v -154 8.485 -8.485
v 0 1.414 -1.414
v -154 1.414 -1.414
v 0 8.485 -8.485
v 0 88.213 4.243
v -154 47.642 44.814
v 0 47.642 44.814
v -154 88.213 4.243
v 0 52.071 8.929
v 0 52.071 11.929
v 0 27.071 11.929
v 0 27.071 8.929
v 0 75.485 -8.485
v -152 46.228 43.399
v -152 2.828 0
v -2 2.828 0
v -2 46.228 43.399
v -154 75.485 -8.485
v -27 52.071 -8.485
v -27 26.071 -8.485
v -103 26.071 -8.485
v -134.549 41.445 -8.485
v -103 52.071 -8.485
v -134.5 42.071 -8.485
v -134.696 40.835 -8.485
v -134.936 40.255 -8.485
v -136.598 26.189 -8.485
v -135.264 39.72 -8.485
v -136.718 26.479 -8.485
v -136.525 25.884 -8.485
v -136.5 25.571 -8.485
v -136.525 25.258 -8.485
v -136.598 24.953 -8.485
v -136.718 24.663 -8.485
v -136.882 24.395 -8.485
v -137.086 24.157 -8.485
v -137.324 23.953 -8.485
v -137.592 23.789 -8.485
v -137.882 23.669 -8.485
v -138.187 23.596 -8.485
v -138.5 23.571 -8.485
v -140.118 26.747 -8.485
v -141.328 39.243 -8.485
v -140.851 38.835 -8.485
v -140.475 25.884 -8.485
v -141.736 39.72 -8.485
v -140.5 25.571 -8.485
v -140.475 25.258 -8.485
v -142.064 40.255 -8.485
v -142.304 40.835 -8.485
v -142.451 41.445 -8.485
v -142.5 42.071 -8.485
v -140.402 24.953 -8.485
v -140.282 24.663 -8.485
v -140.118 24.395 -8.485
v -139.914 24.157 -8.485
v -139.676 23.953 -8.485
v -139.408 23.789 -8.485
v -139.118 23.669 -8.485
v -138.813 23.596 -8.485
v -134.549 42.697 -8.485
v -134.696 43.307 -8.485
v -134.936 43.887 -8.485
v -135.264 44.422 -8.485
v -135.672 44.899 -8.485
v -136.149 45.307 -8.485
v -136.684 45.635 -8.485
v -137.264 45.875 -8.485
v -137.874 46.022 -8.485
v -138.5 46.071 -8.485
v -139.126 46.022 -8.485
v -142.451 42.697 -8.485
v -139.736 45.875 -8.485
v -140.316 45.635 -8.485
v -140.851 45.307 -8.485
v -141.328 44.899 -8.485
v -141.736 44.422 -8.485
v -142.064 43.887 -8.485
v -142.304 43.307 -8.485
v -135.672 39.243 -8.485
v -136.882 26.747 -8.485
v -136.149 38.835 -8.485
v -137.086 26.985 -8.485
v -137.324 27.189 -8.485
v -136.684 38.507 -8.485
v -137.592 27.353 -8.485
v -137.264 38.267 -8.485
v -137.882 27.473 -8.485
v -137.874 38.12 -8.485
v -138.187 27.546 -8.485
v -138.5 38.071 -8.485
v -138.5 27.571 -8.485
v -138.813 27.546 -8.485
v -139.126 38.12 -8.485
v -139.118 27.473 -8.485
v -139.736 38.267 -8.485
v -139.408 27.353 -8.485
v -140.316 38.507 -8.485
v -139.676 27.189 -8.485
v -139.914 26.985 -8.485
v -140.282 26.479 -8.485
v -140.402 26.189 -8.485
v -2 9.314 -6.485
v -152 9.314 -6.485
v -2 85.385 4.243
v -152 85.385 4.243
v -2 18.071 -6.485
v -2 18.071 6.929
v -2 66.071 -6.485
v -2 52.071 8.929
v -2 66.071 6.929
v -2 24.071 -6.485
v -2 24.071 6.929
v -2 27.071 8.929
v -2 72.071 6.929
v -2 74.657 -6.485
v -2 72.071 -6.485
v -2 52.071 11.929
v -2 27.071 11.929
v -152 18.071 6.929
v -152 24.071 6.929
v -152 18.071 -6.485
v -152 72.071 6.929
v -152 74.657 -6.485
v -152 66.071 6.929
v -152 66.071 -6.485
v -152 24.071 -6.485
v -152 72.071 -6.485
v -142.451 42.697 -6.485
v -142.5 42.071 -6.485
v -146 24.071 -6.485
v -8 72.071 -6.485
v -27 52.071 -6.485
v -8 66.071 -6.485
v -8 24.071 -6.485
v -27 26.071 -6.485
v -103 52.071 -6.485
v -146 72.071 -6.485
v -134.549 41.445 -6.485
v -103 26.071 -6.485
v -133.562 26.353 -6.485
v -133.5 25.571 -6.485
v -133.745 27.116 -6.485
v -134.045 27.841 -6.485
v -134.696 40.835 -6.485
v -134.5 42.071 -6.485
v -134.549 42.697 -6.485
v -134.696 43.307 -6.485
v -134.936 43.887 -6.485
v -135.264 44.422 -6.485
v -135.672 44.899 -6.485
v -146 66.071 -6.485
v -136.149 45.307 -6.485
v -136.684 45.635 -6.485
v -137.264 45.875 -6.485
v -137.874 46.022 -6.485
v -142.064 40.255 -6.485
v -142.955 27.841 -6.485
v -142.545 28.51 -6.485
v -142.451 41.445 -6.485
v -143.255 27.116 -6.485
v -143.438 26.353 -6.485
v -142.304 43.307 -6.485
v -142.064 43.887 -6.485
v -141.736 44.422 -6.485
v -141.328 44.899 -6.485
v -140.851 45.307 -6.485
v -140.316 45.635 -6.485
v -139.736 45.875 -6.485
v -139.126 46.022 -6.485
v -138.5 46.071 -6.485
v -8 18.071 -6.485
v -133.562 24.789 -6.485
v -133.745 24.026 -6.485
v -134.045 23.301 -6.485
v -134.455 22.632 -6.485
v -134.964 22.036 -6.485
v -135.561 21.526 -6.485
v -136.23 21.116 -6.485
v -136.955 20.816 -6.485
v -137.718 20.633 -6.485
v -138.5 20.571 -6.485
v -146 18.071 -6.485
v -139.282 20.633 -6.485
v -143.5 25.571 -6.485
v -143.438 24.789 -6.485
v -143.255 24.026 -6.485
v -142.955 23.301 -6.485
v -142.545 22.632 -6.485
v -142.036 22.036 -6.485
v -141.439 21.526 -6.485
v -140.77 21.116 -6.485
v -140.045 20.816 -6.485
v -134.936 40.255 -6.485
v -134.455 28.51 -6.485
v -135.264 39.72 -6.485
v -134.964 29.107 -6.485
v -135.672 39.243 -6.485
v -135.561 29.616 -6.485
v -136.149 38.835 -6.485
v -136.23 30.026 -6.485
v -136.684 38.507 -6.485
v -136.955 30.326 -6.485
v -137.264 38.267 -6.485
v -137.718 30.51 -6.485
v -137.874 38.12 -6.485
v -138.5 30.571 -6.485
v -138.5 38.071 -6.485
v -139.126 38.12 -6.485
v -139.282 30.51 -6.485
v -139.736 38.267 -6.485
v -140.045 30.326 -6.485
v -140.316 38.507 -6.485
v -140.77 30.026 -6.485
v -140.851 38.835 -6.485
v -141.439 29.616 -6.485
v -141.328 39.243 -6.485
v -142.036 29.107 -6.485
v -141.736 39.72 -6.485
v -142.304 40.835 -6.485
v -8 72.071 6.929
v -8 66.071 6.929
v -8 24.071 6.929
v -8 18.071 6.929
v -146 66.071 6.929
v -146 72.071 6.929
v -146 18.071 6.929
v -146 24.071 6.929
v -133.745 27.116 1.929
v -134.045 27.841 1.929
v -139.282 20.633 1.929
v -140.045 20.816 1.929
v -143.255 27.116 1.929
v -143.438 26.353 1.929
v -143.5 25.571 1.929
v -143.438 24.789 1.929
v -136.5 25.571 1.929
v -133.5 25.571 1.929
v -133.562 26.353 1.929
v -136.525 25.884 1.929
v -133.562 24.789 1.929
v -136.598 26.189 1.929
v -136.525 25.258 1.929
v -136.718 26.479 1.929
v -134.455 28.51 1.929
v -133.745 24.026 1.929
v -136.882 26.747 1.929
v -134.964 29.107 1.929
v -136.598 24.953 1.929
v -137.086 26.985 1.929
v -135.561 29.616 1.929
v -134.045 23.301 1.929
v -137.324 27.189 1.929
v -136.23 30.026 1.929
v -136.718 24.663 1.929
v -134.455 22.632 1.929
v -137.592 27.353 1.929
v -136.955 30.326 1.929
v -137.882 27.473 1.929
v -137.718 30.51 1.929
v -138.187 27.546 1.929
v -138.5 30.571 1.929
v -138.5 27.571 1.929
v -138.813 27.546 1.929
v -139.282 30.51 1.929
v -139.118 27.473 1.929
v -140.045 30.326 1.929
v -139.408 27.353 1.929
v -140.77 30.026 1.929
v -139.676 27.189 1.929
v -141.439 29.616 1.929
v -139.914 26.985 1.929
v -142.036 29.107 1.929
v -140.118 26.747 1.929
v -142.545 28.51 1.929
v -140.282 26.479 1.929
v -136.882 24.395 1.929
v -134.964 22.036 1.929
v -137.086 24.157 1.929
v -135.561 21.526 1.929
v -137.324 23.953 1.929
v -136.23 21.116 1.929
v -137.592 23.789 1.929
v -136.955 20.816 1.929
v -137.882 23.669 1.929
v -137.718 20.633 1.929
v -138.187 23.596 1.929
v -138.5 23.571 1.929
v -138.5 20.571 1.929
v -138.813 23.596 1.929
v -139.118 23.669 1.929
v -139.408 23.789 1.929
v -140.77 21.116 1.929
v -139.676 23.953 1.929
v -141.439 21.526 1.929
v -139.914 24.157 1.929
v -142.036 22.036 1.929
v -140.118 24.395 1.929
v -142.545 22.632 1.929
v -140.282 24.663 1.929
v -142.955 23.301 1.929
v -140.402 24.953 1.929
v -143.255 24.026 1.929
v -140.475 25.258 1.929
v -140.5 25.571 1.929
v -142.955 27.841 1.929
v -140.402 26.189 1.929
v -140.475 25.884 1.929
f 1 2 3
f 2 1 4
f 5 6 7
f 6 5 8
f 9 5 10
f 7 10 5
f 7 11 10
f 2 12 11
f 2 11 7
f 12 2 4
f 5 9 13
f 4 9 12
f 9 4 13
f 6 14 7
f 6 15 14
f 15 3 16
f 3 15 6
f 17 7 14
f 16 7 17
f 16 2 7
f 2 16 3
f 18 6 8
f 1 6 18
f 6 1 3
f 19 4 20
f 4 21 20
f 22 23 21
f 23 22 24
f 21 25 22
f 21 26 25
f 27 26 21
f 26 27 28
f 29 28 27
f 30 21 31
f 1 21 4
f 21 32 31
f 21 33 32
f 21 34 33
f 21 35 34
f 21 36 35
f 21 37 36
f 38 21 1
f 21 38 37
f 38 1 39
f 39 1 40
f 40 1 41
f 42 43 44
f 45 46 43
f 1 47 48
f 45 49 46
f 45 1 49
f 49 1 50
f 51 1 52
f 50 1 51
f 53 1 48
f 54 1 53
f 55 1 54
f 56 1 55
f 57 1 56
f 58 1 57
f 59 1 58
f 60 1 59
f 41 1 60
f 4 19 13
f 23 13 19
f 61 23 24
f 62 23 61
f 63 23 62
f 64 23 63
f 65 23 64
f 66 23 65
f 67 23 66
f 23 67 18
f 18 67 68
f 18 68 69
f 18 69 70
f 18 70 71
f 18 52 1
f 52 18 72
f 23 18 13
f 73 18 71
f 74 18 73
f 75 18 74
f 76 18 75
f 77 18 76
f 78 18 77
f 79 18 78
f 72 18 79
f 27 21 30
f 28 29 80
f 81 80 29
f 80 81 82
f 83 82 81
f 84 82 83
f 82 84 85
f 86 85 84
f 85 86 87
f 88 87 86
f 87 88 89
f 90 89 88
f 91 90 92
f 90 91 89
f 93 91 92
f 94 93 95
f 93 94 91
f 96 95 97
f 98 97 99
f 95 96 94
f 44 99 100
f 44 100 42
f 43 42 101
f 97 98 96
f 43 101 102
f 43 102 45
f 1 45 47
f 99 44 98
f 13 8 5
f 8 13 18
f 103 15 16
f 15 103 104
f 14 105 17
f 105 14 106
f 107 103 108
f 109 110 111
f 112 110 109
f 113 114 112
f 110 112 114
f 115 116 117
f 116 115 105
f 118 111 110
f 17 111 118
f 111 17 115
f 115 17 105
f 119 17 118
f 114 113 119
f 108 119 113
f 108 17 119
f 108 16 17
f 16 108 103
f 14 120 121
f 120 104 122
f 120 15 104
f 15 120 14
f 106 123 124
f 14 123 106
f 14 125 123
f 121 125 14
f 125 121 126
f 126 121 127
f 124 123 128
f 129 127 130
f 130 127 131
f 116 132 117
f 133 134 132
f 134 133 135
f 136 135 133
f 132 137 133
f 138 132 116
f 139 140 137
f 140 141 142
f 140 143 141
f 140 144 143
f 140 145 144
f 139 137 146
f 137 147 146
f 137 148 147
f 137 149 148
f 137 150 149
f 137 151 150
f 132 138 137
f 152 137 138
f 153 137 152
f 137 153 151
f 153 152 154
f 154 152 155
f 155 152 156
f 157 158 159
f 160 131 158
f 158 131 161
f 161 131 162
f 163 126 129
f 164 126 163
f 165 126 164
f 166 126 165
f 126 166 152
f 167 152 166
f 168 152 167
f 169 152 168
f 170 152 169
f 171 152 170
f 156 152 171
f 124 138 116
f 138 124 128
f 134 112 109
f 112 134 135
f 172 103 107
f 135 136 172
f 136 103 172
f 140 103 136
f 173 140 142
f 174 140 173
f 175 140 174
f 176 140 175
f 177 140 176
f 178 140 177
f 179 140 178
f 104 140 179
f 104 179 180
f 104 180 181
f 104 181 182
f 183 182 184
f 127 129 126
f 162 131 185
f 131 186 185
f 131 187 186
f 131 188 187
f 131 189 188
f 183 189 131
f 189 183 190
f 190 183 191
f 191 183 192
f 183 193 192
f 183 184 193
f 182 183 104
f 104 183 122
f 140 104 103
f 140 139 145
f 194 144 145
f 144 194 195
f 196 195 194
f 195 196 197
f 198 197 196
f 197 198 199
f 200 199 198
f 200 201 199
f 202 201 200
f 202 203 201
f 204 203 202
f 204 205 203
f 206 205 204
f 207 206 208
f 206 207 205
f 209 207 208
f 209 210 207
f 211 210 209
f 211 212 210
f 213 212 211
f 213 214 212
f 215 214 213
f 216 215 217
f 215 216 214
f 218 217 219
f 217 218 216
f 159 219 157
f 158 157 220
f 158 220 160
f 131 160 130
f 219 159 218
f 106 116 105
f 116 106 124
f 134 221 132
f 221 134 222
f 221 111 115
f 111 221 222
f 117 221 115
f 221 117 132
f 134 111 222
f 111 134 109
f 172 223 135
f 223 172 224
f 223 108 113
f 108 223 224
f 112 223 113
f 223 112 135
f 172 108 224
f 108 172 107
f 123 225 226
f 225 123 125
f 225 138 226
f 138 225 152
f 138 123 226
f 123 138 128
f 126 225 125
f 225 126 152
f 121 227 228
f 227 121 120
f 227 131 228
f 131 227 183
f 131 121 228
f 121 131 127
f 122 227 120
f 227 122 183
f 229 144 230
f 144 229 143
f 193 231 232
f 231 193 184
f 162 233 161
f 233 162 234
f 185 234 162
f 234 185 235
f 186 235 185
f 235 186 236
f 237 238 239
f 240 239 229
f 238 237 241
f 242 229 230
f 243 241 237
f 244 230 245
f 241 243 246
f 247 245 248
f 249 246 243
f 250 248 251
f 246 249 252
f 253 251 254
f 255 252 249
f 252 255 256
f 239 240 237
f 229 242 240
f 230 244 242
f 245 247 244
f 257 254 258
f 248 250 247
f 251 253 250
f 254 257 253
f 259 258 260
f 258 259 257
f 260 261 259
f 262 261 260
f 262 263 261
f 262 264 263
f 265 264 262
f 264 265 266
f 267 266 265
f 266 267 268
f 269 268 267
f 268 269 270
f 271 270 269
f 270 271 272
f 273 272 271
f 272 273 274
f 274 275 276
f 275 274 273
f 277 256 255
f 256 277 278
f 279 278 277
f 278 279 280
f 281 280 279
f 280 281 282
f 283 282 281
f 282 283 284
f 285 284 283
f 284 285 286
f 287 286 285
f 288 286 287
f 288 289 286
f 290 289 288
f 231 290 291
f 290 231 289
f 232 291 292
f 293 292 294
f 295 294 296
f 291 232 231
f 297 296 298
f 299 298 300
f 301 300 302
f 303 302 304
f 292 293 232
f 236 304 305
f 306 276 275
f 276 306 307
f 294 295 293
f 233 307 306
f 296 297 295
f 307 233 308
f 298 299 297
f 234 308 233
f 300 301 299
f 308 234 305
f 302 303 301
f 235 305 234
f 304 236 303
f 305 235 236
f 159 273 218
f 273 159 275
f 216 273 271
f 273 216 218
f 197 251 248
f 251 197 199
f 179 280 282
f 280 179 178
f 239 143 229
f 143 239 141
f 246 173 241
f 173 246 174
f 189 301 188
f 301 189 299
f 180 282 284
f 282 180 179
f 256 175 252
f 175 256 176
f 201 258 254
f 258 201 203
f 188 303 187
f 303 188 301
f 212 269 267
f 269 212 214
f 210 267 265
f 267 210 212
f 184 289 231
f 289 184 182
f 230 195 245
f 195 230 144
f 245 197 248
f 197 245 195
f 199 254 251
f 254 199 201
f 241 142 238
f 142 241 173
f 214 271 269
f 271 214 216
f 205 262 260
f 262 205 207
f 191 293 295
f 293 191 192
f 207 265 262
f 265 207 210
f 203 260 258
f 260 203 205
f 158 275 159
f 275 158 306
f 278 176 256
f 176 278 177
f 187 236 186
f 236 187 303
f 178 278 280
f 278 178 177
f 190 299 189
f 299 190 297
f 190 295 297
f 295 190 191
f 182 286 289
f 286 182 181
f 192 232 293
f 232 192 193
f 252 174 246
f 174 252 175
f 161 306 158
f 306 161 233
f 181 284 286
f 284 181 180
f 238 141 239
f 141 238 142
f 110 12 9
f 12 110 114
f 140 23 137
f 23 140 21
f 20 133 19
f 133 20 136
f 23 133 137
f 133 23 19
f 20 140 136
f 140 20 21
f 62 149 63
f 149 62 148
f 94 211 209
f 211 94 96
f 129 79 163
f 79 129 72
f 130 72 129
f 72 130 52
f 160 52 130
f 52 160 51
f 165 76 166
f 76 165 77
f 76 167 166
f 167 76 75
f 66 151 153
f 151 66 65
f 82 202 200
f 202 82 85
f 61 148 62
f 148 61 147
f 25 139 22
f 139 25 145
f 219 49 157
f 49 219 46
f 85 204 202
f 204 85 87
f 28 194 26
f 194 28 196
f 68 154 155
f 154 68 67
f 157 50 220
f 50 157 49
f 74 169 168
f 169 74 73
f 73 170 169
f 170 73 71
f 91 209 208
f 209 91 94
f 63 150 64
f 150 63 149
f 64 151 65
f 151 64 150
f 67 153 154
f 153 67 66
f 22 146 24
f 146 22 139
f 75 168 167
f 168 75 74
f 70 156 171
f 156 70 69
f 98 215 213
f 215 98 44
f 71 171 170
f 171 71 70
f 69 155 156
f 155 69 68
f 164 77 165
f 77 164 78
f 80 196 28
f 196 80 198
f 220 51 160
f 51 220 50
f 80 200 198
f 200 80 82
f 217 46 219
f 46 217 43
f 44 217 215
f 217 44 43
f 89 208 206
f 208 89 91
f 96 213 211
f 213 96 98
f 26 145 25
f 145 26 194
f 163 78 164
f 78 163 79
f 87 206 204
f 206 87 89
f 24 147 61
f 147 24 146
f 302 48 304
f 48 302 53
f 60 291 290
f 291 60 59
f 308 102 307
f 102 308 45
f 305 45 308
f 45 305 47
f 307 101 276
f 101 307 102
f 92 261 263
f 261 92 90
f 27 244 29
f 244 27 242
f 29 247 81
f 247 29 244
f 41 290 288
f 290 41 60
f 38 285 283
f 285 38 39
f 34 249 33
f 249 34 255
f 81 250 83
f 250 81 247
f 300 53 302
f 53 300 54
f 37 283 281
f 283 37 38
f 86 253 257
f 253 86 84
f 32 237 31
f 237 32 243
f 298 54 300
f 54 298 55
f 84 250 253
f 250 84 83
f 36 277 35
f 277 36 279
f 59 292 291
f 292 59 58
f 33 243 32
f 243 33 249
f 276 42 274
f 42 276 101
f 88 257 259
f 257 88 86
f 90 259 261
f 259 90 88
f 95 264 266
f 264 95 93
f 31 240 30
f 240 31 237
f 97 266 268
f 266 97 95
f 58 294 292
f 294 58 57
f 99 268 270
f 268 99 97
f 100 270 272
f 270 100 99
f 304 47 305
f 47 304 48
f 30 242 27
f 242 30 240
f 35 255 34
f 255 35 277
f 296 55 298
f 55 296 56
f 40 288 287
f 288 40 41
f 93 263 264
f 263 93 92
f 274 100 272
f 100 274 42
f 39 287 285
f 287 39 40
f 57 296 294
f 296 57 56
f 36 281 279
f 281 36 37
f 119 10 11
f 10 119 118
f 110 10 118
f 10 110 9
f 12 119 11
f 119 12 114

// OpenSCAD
// file: ../dopOpenScadHelpers.scad
// use this file using the following statement:
// include <../dopOpenScadHelpers.scad>

runTests = false;

function tail(vector) =
    1 >= len(vector) ? [] : [ for (i = [1 : len(vector)-1]) vector[i] ];

function _splitRestOfStringBySpace(resultArraySoFar, currentString, string) = 
    0 == len(string) ?
    concat(resultArraySoFar,[currentString]) :
    " " == string[0] ?
        _splitRestOfStringBySpace(concat(resultArraySoFar, [currentString]), "", tail(string)) :
        _splitRestOfStringBySpace(resultArraySoFar, str(currentString,string[0]), tail(string)) ;

function splitStringBySpace(string) = _splitRestOfStringBySpace([],"",string);

if (runTests) {
    echo(tailTest1=[]==tail([[0,0]]));
    echo(tailTest2=[[1,1]]==tail([[0,0],[1,1]]));
    echo(testSpaceSplitsStringIntoArray=["on","three", "lines"]==splitStringBySpace("on three lines"));
}

function relativeStepsToAbsoluteCoordinates(positionsSoFar, remainingSteps) = 
    0 == len(remainingSteps) ?
    positionsSoFar :
    relativeStepsToAbsoluteCoordinates(
        concat(positionsSoFar,
            [ [positionsSoFar[len(positionsSoFar)-1][0] + remainingSteps[0][0]*cos(remainingSteps[0][1]),
              positionsSoFar[len(positionsSoFar)-1][1] + remainingSteps[0][0]*sin(remainingSteps[0][1])] ]),
        tail(remainingSteps) );

if (runTests) {
    echo(relativeStepsToAbsoluteCoordinatesTest1=[[0, 0], [10, 0]]==relativeStepsToAbsoluteCoordinates([[0,0]], [[10,0]]));
    echo(relativeStepsToAbsoluteCoordinatesTest2=relativeStepsToAbsoluteCoordinates([[0,0]], [[10,0],[10,60]]));
    echo(relativeStepsToAbsoluteCoordinatesTest3=relativeStepsToAbsoluteCoordinates([[0,0]], [[10, 0], [10, 60], [10, 120], [10, 180], [10, 240], [10, 300]]));
}


function _angleNormalized(angle) = ((angle % 360)+360)%360;

/// helper function to avoid problem when rotating figures that
// e.g. union() {rotate([0,0,30])square([9,9,9]); rotate([0,0,-30])square([9,9,9]);} is not symmetrical across the expected axes
// -> mirror() plus adapted angle helps: union() {rotate([0,0,30])square([9,9,9]); mirror([1,0,0])rotate([0,0,30])square([9,9,9]);}
// angle [0..180[ -> returns [angle, 0] (i.e. no mirroring)
// angle ]180..360[ -> returns [360-angle, 1) (i.e. mirroring)
function newAngleMirrorFromAngle(angle) =
    [_angleNormalized(angle) > 180 ? 360 - _angleNormalized(angle) : angle, _angleNormalized(angle)>180 ? 1 : 0];

if (runTests) {
    echo(newAngleMirrorFromAngleTest=newAngleMirrorFromAngle(30)==[30,0]);
    echo(newAngleMirrorFromAngleTest=newAngleMirrorFromAngle(360+30)==[390,0]);
    echo(newAngleMirrorFromAngleTest=newAngleMirrorFromAngle(150)==[150,0]);
    echo(newAngleMirrorFromAngleTest=newAngleMirrorFromAngle(360+150)==[510,0]);
    echo(newAngleMirrorFromAngleTest=newAngleMirrorFromAngle(190)==[360-190,1]);
    echo(newAngleMirrorFromAngleTest=newAngleMirrorFromAngle(720+190)==[360-190,1]);
    echo(newAngleMirrorFromAngleTest=newAngleMirrorFromAngle(-60)==[60,1]);
    echo(newAngleMirrorFromAngleTest=newAngleMirrorFromAngle(360-60)==[60,1]);
    echo(newAngleMirrorFromAngleTest=newAngleMirrorFromAngle(-330)==[-330,0]);
}

module displayPolygon(directions, debug=false) {
    figure = relativeStepsToAbsoluteCoordinates([[0,0]], directions);
    // echo(directions=directions);
    if (debug) echo(figure=figure);
    polygon(figure);
}

module extractProfileWithThickness(directions, thickness) {
    echo("IMPLEMENT ME: see example in HolderPowerSupply.scad");
    echo("- example with simple form: HolderPowerSupply.scad, module form()");
    echo("- difficult with angles not factor of 90degrees -> see HousingCNCControl.scad, module housing()");
}

module extract2DFromModelAtHeight(stlFile, heightOfSlice) {
    projection()
    intersection() {
        translate([0,0,-heightOfSlice])import(stlFile);
        cube([1000,1000,1], center=true);
    }
}

module extract2DFromImageAtIntensityValue(imageFile, heightOfSlice, center=false) {
    projection()
    intersection() {
        translate([0,0,heightOfSlice])surface(imageFile, invert=true, center=center);
        cube([1000,1000,1], center=center);
    }
}

// according https://www.reddit.com/r/openscad/comments/3jwobs/line_feed_in_openscad_text/
module multiLine(lines, startPos, size){
  union(){
    for (i = [0 : len(lines)-1])
      translate([startPos[0] , startPos[1] + ((len(lines)-1)/2-i) * 1.5*size, 0 ]) text(lines[i], size=size, halign="center", valign="center");
  }
}

// ----------

function _max_nrOfColumns(wColumn, spaceBetweenColumns, wTotal) =
    ceil(wTotal/(wColumn+spaceBetweenColumns));

function _nrOfColumns(wColumn, spaceBetweenColumns, wTotal) =
    wTotal-0.19 < _max_nrOfColumns(wColumn, spaceBetweenColumns, wTotal)*wColumn+(_max_nrOfColumns(wColumn, spaceBetweenColumns, wTotal)-1)*spaceBetweenColumns ?
    _max_nrOfColumns(wColumn, spaceBetweenColumns, wTotal)-1 :
    _max_nrOfColumns(wColumn, spaceBetweenColumns, wTotal);

if (runTests) {
    echo(nrOfColumnsTest1=0==_nrOfColumns(2,1,2.0));
    echo(nrOfColumnsTest2=1==_nrOfColumns(2,1,2.2));
    echo(nrOfColumnsTest3=1==_nrOfColumns(2,1,5.1));
    echo(nrOfColumnsTest4=2==_nrOfColumns(2,1,5.2));
    echo(nrOfColumnsTest5=2==_nrOfColumns(2,1,8.1));
    echo(nrOfColumnsTest6=3==_nrOfColumns(2,1,8.2));
    echo(nrOfColumnsTest7=4==_nrOfColumns(2,1,13));
}

module supportColumns(dimensions, debug=false) {
    wColumn=2;
    spaceBetweenColumns=wColumn;
    dColumn=0.1;

    nrOfColumns=_nrOfColumns(wColumn, spaceBetweenColumns, dimensions[0]);
    initialOffset=(dimensions[0]-nrOfColumns*wColumn-(nrOfColumns-1)*spaceBetweenColumns)/2;
    if (debug) {
        echo(nrOfColumns=nrOfColumns);
        echo(initialOffset=initialOffset);
    }
    for (x=[initialOffset:wColumn+spaceBetweenColumns:dimensions[0]-initialOffset]) {
        translate([x,spaceBetweenColumns,0])difference() {
            cube([wColumn, dimensions[1]-2*spaceBetweenColumns, dimensions[2]]);
            translate([dColumn,0,0])cube([wColumn-2*dColumn, dimensions[1]-2*spaceBetweenColumns-dColumn,dimensions[2]]);
        }
    }
}
// main file
include <../dopOpenScadHelpers.scad>

d=2;

showTopNotBottom = true;


$fn=40;

holeOffset=3;
xPCB=144+2*holeOffset;
yPCB=48+2*holeOffset;
heightScreenFromPCB=14;

xFront=2*d+xPCB;
yFront=2*d+yPCB+9;
alpha=45;

module board() {
    xScreen=76;
    yScreen=26;
    dPCB=2;
    
    // pcb
    translate([0,0,-dPCB])cube([xPCB,yPCB,dPCB]);
    // screen
    translate([25,yPCB-20-yScreen])cube([xScreen,yScreen,heightScreenFromPCB+d]);
    // poti: 
    translate([xPCB-13.5,yPCB-30])cylinder(d=8,h=heightScreenFromPCB+d);
    // emergencyStop
    translate([xPCB-13.5,7.5])cylinder(d=4,h=heightScreenFromPCB+d);
    // SD slot
    translate([-5,9,-dPCB-3])cube([32,25,3]);
}

function angleComp() = (1-cos(alpha))/sin(alpha);   // if non-overlapping
function angleComp2() = (1-sin(alpha))/cos(alpha);  // if overlapping



depthRoof=20;

sideAsVectors = [[10,90],[yFront,alpha],[depthRoof-d,0],[sin(alpha)*yFront+10,-90] ];

module housing() {
    translate([0,0,d])rotate([90,0,90])   
    difference() {
        linear_extrude(height=xFront)displayPolygon(sideAsVectors, true);
        translate([d,0,d])
        linear_extrude(height=xFront-2*d)
        displayPolygon([[10-d*angleComp2(),90],[yFront-2*d*angleComp2(),alpha],[depthRoof-d*angleComp2()-2*d,0],[sin(alpha)*yFront+10-d,-90] ], true);
    }
    rotate([alpha,0,0])
    translate([0,10*cos(alpha),10*cos(alpha)-heightScreenFromPCB]){
        // Befestigung fuer PCB
        for (x=[d,d+144]) {
            for (y=[yFront-d-6,yFront-d-6-48]) {
                translate([x,y,0])cube([6,6,heightScreenFromPCB]);
            }
        }
        // Fuehrung fuer Emergency Stop
        translate([xPCB-13.5+d,yFront-d-6-48+7.5,5])cylinder(d=10,h=heightScreenFromPCB-5);
    }
}

module bottom() {
    sidePolygon=relativeStepsToAbsoluteCoordinates([[0,0]], sideAsVectors);
    yBottom=sidePolygon[len(sidePolygon)-1][0];
    difference() {
        cube([xFront-2*d-1,yBottom-2*d-1,10]);
        translate([d,d,d])cube([xFront-2*d-1 - 2*d,yBottom-2*d-1 - 2*d,10-d]);
        translate([62,22,0])cube([40,10,d]);
    }
    for (x=[d,xFront-2*d-1 - d-10]) {
        translate([x,yBottom/2-d-10/2,0])cube([10,10,10]);
    }
}

if (showTopNotBottom)
    rotate([0,0,180])
    difference() {
        rotate([180-alpha,0,0])    
        difference() {
            housing();
            #translate([0,0,10])rotate([alpha,0,0])translate([d,d+9,-heightScreenFromPCB])board();
        }
    }
else {
    translate([d,d,0])bottom();
}
